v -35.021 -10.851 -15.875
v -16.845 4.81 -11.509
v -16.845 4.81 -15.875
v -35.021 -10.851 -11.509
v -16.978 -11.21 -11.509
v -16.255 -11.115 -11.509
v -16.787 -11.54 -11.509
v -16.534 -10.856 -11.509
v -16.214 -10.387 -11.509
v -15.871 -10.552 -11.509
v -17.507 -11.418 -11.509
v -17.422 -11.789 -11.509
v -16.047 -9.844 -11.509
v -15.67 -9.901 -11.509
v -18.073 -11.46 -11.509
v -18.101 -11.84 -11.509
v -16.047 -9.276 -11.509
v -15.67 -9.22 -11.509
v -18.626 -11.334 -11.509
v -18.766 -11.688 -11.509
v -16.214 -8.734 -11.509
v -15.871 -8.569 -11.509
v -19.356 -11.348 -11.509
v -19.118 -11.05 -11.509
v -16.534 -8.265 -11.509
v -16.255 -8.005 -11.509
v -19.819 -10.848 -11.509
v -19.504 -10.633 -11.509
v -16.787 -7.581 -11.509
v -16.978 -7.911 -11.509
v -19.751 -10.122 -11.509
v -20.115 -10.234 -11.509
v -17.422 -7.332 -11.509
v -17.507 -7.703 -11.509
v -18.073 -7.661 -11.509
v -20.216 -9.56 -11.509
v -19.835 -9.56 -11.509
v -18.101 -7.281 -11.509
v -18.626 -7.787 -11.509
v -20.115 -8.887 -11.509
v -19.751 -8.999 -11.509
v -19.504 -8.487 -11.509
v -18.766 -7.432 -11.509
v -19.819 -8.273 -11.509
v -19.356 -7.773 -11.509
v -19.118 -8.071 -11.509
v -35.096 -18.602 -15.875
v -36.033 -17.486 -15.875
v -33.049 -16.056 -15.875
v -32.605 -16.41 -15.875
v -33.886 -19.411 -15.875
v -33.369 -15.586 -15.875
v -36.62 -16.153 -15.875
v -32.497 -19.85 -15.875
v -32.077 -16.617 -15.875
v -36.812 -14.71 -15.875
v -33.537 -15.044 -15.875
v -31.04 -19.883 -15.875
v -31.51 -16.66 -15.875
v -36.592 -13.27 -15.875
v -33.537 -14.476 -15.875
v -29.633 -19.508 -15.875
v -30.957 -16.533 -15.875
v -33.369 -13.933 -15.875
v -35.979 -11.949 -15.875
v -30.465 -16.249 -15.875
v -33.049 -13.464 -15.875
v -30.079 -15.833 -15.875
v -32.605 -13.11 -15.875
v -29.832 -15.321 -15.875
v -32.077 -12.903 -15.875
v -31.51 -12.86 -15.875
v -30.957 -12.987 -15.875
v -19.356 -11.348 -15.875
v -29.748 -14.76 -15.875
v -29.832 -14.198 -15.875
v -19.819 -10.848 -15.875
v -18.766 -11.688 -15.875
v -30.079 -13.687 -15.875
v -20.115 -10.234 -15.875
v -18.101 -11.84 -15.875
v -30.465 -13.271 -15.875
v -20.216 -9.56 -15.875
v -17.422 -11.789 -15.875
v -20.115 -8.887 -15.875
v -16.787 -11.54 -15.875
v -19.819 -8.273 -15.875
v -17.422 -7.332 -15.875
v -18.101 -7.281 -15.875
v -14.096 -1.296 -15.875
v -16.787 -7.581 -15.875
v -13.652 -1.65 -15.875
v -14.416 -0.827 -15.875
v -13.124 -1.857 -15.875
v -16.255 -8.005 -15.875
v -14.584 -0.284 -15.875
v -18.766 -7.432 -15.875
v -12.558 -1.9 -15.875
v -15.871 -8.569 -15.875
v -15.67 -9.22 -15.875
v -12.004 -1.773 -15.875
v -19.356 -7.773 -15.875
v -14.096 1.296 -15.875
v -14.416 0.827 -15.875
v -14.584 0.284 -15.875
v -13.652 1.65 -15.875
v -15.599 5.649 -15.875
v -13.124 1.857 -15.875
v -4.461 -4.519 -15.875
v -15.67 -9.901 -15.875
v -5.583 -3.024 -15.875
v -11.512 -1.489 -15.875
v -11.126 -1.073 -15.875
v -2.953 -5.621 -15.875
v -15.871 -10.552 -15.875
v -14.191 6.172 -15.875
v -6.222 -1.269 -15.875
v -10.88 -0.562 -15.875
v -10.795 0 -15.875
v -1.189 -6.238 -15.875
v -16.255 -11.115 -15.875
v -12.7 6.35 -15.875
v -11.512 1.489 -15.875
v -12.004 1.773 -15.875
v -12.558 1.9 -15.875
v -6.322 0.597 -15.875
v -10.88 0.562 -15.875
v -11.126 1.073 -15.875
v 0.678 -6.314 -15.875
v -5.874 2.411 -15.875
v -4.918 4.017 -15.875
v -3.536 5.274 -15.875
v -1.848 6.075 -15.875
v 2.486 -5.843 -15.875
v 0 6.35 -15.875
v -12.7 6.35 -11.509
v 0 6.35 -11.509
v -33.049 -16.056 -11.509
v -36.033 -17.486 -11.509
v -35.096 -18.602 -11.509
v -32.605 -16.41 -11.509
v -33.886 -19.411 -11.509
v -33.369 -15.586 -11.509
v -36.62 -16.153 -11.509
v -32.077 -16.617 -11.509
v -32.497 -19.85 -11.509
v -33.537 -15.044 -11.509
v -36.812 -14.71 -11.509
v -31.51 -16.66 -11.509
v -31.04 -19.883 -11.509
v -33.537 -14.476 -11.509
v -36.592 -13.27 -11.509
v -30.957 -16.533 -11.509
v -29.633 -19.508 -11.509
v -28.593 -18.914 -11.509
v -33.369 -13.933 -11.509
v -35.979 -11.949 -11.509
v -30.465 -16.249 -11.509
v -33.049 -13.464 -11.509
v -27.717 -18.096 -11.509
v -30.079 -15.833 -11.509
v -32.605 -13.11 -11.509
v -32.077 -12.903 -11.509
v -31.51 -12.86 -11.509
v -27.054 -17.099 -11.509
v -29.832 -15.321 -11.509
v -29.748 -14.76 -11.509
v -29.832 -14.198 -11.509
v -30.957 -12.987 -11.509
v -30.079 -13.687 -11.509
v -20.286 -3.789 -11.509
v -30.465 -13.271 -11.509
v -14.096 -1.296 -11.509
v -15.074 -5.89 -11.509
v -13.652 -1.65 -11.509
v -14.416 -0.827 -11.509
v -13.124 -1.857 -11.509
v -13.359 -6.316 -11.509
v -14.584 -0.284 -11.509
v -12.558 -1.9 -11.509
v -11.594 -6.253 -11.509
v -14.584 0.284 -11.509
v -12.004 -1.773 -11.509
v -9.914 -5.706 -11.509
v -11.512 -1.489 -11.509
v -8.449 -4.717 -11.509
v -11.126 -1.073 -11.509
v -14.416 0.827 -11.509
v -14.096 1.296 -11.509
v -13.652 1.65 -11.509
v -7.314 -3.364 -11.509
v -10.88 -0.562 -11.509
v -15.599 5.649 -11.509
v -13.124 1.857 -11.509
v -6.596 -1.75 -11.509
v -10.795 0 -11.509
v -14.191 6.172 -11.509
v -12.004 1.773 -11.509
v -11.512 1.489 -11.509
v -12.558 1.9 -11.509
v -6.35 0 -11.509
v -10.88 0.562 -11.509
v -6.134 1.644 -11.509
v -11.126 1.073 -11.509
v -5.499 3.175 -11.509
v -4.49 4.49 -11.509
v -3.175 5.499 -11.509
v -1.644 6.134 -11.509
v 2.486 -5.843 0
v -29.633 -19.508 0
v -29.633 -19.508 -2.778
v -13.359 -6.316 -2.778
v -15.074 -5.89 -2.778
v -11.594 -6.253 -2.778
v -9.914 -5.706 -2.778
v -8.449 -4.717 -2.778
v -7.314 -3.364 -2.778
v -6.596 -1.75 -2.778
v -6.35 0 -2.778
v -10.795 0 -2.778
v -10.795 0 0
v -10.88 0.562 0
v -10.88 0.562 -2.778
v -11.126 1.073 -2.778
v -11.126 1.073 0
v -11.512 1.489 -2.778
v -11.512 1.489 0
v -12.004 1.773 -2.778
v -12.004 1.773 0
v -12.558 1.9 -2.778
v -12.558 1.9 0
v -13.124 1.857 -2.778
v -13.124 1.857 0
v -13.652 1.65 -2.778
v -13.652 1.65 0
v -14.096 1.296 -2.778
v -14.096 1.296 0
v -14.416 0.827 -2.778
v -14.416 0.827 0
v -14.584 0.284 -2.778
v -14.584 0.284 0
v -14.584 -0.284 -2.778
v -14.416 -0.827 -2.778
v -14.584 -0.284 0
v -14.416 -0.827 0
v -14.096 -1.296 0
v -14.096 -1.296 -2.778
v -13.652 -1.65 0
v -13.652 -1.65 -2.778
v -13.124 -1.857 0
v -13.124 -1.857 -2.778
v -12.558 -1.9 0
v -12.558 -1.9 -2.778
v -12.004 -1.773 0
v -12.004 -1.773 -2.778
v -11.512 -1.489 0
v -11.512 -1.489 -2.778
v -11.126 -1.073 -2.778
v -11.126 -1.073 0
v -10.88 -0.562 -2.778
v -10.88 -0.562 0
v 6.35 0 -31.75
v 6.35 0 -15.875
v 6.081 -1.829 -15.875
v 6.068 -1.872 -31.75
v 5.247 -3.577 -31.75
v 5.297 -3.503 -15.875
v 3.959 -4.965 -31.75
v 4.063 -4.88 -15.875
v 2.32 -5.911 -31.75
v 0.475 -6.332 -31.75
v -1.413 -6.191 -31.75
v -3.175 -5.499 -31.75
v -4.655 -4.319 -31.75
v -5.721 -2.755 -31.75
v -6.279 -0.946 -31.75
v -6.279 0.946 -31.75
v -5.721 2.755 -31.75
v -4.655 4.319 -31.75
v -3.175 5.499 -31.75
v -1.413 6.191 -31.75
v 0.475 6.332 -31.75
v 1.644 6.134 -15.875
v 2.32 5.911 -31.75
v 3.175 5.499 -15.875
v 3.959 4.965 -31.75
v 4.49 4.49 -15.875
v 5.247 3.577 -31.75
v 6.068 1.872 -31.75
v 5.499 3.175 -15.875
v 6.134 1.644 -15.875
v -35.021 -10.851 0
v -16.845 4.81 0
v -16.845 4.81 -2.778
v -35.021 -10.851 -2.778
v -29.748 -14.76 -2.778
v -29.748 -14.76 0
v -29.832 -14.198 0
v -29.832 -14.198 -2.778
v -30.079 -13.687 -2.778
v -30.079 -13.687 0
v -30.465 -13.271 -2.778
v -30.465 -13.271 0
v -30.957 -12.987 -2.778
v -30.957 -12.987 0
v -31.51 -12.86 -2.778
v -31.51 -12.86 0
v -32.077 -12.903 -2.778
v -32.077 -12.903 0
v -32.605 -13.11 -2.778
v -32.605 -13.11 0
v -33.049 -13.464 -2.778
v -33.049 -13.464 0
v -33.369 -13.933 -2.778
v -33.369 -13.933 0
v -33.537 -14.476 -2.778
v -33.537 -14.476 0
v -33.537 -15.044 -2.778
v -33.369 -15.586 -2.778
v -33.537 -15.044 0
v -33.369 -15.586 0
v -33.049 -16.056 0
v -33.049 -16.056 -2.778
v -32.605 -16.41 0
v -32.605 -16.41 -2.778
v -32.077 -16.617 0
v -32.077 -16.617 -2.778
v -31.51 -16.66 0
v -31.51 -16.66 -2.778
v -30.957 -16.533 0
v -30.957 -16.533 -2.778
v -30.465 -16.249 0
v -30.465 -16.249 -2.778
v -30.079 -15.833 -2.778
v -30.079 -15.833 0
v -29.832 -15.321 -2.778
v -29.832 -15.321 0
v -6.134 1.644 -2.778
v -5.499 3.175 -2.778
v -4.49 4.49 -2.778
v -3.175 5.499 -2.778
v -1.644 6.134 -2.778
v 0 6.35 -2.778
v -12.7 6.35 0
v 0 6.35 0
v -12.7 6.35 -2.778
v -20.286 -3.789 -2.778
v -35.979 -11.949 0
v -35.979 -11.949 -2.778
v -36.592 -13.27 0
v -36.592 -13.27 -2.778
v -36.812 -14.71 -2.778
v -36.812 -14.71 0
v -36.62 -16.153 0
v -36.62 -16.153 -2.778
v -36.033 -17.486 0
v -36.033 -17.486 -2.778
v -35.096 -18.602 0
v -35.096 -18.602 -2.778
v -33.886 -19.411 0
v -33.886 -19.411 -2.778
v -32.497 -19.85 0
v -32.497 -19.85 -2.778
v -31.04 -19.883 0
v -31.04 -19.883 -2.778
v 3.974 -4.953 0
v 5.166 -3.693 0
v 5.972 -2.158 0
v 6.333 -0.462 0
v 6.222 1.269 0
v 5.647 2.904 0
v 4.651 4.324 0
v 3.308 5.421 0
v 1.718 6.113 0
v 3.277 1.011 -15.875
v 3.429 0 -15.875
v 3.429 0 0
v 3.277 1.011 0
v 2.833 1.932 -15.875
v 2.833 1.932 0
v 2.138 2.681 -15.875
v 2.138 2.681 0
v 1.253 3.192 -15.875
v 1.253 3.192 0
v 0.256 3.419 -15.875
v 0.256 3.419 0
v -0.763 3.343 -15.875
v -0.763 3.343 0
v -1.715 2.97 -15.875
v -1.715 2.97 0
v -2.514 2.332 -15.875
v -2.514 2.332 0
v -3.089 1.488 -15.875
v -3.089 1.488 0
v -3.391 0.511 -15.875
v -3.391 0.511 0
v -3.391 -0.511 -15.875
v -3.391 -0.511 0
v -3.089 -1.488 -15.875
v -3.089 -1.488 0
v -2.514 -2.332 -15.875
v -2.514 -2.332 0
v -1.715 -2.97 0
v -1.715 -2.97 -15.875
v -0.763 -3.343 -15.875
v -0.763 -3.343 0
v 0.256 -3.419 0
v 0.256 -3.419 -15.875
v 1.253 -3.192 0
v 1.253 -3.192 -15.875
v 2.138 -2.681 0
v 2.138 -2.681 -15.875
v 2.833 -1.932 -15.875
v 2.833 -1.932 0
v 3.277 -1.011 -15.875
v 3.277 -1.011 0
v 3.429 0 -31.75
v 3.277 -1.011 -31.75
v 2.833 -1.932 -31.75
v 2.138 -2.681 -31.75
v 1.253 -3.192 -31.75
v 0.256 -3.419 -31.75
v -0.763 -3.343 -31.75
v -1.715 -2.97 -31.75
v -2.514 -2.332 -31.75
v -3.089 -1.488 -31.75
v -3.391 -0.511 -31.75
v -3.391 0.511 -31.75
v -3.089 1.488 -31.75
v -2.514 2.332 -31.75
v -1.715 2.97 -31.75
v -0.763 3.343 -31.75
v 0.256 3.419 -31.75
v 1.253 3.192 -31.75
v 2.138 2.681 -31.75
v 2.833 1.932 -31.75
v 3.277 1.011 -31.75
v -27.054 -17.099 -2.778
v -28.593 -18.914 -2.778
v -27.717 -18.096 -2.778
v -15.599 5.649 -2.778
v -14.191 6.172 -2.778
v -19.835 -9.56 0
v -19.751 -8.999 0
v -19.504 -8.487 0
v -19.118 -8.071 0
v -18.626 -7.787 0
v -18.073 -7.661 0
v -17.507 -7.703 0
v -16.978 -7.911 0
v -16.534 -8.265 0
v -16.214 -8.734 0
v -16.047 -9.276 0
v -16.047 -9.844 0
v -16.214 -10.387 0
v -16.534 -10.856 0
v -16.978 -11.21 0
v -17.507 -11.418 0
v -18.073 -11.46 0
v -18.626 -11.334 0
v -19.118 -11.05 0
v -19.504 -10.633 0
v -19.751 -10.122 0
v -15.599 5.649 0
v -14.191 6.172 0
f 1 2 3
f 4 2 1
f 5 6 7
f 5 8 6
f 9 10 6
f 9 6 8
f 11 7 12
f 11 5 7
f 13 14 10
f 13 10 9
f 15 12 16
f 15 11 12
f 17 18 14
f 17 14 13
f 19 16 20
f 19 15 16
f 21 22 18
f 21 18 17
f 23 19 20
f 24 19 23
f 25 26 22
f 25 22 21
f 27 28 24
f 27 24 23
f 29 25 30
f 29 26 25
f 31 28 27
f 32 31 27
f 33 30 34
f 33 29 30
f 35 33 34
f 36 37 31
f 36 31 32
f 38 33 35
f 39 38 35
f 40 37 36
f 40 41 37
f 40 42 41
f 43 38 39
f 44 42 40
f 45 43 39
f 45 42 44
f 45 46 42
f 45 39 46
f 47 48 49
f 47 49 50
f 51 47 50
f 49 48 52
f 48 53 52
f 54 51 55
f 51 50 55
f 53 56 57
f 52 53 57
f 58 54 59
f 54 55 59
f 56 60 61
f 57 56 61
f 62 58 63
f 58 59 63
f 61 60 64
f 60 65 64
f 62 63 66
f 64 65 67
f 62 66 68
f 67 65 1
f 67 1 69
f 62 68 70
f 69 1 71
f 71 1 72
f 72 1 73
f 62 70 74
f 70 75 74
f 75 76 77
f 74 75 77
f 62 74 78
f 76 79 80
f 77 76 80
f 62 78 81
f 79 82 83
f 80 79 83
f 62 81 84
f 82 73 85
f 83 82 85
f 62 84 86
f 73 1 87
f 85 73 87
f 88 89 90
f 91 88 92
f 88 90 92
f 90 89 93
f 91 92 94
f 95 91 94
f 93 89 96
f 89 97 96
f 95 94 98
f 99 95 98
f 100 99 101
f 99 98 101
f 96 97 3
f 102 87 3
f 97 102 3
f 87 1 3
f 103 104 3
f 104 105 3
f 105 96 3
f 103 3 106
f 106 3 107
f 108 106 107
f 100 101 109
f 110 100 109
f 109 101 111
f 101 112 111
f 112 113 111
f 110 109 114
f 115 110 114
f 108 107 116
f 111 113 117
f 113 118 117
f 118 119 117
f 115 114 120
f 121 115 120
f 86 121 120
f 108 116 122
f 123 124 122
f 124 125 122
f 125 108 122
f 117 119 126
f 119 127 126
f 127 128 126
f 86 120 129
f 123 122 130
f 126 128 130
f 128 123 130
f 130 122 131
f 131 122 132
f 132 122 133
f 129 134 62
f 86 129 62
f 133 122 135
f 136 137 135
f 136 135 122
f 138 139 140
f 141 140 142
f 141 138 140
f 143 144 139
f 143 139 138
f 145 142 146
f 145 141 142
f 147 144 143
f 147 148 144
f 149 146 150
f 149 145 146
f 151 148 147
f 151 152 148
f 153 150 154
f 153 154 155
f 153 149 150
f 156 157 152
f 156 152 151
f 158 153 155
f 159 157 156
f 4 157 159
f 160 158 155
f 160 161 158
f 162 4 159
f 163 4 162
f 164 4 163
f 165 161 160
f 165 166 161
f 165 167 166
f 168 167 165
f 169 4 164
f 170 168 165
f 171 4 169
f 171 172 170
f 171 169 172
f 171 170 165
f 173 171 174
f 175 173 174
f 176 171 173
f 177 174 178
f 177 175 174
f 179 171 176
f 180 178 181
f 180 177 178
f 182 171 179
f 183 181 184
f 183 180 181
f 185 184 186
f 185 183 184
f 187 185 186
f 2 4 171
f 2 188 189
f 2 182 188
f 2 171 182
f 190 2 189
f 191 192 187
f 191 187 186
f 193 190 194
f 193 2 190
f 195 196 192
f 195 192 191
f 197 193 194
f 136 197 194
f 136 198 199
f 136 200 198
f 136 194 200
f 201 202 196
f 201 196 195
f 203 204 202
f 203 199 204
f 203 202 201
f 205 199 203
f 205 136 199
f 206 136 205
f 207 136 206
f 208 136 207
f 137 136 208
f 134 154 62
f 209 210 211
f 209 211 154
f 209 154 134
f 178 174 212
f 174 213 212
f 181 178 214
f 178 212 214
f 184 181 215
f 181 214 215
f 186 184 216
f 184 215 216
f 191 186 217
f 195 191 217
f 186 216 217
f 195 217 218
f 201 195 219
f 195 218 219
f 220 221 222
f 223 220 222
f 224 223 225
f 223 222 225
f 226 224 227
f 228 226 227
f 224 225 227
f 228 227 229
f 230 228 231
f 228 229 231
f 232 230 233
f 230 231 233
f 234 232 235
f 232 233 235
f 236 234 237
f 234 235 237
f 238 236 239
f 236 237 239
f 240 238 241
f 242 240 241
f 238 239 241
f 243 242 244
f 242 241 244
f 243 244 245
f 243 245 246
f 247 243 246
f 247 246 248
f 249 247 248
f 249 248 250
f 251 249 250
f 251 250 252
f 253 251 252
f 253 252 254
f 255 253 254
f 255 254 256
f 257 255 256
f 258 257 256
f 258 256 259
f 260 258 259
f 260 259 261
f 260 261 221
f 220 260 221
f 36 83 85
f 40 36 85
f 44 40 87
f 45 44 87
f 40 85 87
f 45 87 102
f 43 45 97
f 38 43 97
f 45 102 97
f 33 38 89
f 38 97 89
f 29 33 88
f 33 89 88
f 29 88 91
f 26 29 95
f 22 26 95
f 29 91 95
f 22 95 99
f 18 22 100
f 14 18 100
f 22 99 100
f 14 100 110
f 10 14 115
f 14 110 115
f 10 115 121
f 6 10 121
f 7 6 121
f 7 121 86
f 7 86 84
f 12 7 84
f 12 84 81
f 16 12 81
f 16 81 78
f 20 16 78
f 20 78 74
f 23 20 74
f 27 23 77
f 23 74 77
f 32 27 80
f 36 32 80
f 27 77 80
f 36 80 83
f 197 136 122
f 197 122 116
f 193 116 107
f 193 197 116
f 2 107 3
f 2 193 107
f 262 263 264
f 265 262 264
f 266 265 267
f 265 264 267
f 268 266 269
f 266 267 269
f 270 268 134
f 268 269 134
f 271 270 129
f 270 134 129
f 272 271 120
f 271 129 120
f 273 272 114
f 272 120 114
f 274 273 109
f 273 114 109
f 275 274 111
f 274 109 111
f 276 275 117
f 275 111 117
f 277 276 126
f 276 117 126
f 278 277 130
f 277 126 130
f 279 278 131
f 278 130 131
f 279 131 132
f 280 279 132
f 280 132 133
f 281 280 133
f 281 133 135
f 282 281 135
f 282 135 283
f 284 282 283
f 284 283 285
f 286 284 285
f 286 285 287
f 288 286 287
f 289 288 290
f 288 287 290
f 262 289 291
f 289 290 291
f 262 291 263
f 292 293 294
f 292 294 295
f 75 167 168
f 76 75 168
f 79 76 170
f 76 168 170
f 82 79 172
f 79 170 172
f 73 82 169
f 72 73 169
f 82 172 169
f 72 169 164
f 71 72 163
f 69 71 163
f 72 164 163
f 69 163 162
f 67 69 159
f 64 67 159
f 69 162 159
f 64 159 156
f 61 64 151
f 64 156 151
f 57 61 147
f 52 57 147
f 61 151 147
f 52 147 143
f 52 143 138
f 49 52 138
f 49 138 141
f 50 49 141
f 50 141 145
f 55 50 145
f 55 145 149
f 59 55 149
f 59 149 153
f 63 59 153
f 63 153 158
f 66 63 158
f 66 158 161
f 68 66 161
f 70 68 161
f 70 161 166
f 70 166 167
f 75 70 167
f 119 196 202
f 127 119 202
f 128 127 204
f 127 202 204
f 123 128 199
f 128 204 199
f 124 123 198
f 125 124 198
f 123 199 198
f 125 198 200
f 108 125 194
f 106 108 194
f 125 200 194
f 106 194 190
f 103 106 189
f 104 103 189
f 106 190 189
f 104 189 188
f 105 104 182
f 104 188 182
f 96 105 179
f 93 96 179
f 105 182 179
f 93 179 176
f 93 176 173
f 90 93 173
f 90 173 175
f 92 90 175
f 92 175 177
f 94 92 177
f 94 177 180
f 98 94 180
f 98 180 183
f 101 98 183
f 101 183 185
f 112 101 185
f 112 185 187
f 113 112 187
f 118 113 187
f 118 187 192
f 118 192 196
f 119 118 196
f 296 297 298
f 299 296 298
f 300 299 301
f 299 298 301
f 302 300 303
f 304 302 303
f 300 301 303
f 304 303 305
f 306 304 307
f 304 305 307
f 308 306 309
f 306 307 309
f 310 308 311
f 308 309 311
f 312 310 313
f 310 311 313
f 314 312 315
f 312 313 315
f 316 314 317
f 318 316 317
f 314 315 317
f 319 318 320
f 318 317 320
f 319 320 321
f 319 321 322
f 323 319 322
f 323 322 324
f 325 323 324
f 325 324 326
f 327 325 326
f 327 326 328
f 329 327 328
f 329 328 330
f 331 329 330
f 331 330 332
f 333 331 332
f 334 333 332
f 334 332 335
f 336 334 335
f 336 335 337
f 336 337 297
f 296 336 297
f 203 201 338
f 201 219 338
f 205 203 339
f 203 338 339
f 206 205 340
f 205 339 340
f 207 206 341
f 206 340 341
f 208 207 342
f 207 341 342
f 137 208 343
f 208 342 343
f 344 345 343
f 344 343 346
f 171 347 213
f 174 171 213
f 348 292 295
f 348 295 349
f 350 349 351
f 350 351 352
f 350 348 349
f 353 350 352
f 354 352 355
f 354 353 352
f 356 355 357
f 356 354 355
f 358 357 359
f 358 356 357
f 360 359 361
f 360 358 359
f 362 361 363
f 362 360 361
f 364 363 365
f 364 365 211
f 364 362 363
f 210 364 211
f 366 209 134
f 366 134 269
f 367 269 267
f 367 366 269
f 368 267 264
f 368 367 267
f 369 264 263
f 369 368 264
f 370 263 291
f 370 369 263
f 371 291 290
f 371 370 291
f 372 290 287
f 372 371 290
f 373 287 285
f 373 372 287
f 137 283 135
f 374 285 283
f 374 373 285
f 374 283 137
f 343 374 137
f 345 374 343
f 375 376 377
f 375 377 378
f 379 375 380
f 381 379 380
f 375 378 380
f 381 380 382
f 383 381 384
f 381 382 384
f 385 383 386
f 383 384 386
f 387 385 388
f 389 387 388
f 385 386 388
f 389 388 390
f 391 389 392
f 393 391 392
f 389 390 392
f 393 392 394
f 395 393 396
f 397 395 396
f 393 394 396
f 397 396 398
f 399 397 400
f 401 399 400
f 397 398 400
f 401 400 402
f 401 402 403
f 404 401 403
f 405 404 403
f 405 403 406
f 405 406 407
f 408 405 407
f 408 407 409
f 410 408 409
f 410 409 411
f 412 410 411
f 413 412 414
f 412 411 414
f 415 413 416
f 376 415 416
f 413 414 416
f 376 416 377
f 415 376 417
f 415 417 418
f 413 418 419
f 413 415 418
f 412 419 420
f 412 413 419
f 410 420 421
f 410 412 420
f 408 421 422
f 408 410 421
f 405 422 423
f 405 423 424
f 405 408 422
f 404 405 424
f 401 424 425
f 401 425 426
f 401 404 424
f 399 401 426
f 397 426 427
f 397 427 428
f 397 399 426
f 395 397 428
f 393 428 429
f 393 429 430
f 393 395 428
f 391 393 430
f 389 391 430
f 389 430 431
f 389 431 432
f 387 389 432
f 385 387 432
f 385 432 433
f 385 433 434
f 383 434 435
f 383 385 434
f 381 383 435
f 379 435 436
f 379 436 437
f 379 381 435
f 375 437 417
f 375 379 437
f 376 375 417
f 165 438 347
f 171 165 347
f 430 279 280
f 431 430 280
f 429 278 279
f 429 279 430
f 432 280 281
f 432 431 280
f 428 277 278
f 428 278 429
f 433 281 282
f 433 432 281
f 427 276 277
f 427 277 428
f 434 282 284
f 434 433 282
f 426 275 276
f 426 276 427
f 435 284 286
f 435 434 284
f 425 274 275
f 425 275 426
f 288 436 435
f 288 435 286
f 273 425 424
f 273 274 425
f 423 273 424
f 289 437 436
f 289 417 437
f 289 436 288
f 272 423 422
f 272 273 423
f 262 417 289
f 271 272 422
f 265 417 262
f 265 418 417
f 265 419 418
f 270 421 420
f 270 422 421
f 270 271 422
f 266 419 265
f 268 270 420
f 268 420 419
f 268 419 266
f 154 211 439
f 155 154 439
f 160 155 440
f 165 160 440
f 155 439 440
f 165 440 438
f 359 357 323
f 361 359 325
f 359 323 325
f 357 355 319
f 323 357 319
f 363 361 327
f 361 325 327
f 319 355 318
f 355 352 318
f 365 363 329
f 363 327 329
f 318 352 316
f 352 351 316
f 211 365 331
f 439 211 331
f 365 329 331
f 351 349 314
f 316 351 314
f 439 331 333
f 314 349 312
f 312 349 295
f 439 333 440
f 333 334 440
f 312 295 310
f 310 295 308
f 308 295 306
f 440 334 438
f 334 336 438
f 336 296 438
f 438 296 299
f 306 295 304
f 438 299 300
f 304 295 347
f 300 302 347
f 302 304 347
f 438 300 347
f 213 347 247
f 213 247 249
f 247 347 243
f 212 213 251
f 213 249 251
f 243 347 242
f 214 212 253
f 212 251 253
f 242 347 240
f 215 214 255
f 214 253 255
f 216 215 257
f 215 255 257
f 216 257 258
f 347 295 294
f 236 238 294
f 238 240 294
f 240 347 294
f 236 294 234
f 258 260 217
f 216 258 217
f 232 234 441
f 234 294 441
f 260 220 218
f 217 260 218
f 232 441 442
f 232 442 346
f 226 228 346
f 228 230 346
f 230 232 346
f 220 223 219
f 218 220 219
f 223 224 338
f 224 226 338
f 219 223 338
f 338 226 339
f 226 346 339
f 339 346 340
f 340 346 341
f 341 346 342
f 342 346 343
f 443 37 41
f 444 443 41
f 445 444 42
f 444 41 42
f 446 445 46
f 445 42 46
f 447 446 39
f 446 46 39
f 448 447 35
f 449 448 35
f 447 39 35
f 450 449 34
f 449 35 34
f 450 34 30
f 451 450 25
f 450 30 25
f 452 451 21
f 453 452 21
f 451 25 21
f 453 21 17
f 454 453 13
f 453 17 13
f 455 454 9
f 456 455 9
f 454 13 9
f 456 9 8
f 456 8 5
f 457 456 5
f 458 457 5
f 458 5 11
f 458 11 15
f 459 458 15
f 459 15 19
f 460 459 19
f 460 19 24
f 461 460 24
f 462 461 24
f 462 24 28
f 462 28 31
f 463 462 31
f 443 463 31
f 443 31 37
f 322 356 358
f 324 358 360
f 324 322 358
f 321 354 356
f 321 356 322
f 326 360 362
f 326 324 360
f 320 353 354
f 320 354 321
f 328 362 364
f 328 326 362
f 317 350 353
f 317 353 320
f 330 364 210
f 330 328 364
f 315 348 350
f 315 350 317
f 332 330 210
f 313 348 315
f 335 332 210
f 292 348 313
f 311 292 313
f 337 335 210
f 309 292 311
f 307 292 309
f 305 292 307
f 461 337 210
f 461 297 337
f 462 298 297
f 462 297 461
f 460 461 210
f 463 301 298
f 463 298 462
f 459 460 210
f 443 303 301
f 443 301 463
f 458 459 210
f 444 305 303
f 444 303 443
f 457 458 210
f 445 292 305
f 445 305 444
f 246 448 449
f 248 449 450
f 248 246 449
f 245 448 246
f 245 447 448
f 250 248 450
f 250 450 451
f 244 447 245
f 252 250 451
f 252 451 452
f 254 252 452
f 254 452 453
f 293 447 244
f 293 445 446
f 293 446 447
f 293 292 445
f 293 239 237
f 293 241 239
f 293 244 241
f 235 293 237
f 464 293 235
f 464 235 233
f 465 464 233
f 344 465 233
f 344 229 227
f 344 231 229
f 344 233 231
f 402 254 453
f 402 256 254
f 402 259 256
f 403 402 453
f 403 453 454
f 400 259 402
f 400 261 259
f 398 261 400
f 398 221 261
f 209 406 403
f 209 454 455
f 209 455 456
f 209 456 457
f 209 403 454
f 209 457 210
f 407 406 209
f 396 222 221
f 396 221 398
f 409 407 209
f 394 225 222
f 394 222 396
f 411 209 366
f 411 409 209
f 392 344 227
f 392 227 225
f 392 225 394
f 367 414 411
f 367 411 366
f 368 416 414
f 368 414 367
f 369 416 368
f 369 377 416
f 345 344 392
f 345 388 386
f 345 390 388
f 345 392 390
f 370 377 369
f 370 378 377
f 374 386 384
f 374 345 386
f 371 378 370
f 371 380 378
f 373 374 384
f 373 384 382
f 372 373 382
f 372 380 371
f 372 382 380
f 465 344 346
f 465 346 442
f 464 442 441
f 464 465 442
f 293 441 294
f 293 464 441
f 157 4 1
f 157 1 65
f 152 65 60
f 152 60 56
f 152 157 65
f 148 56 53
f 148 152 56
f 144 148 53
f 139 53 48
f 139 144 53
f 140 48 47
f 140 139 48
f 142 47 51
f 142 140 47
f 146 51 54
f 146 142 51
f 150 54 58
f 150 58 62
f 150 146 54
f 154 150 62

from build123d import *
from build123d.topology import SkipClean

# Parameters (mm, degrees)
SKETCH1_R           = 1.905
SKETCH1_R_2         = 3.429
BOSS_EXTRUDE1_DEPTH = 15.875
CUT_EXTRUDE2_DEPTH  = 4.365625
SKETCH6_R           = 6.35
SKETCH6_R_2         = 3.429
BOSS_EXTRUDE2_DEPTH = 15.875
SKETCH7_R           = 1.905
CUT_EXTRUDE4_DEPTH  = 45.765288281
SKETCH8_R           = 2.286
CUT_EXTRUDE5_DEPTH  = 4.365625


with BuildPart() as part:
    # Sketch1 → Boss-Extrude1 (new body)
    with BuildSketch(Plane.XY):
        with BuildLine():
            Line((-29.633029251, -19.50753994), (2.485871029, -5.843196491))
            ThreePointArc((2.485871029, -5.843196491), (6.22200923, 1.268503505), (0, 6.35))
            Line((0, 6.35), (-12.7, 6.35))
            ThreePointArc((-12.7, 6.35), (-14.910911787, 5.952677471), (-16.845147964, 4.810431203))
            Line((-16.845147964, 4.810431203), (-35.020732183, -10.851467439))
            ThreePointArc((-35.020732183, -10.851467439), (-36.033014448, -17.486271287), (-29.633029251, -19.50753994))
        make_face()
        with Locations((-12.7, 0)):
            Circle(SKETCH1_R, mode=Mode.SUBTRACT)
        with Locations((-31.652799462, -14.759942791)):
            Circle(SKETCH1_R, mode=Mode.SUBTRACT)
        Circle(SKETCH1_R_2, mode=Mode.SUBTRACT)
    extrude(amount=-BOSS_EXTRUDE1_DEPTH)

    # Sketch4 → Cut-Extrude2 (cut, symmetric)
    with SkipClean():  # the faces are left unmerged after this step: merging them gives an invalid solid
        with BuildSketch(Plane.XY.offset(-7.14375)):
            with BuildLine():
                Line((0, 6.35), (-12.7, 6.35))
                ThreePointArc((-12.7, 6.35), (-14.910911787, 5.952677471), (-16.845147964, 4.810431203))
                Line((-16.845147964, 4.810431203), (-35.020732183, -10.851467439))
                ThreePointArc((-35.020732183, -10.851467439), (-36.033014448, -17.486271287), (-29.633029251, -19.50753994))
                ThreePointArc((-29.633029251, -19.50753994), (-28.131062442, -18.530422701), (-27.053869093, -17.098529939))
                Line((-27.053869093, -17.098529939), (-20.285757113, -3.788751957))
                Line((-20.285757113, -3.788751957), (-15.073987601, -5.889540124))
                ThreePointArc((-15.073987601, -5.889540124), (-9.146995726, -5.262951703), (-6.35, 0))
                ThreePointArc((-6.35, 0), (-4.490128061, 4.490128061), (0, 6.35))
            make_face()
        extrude(amount=CUT_EXTRUDE2_DEPTH, both=True, mode=Mode.SUBTRACT)

    # Sketch6 → Boss-Extrude2 (add)
    with SkipClean():  # the faces are left unmerged after this step: merging them gives an invalid solid
        with BuildSketch(Plane(origin=(0, 0, -15.875), x_dir=(-1, 0, 0), z_dir=(0, 0, -1))):
            with Locations(Location((0, 0, 0), (0, 0, 180))):
                Circle(SKETCH6_R)
            with Locations(Location((0, 0, 0), (0, 0, 180))):
                Circle(SKETCH6_R_2, mode=Mode.SUBTRACT)
        extrude(amount=BOSS_EXTRUDE2_DEPTH)

    # Sketch7 → Cut-Extrude4 (cut, through all)
    with SkipClean():  # the faces are left unmerged after this step: merging them gives an invalid solid
        with BuildSketch(Plane(origin=(0, 0, -15.875), x_dir=(-1, 0, 0), z_dir=(0, 0, -1))):
            with Locations((17.930468191, -9.560371879)):
                Circle(SKETCH7_R)
        extrude(amount=-CUT_EXTRUDE4_DEPTH, mode=Mode.SUBTRACT)

    # Sketch8 → Cut-Extrude5 (cut)
    with SkipClean():  # the faces are left unmerged after this step: merging them gives an invalid solid
        with BuildSketch(Plane(origin=(0, 0, -15.875), x_dir=(-1, 0, 0), z_dir=(0, 0, -1))):
            with Locations((17.930468191, -9.560371879)):
                Circle(SKETCH8_R)
        extrude(amount=-CUT_EXTRUDE5_DEPTH, mode=Mode.SUBTRACT)


solid = part.part
